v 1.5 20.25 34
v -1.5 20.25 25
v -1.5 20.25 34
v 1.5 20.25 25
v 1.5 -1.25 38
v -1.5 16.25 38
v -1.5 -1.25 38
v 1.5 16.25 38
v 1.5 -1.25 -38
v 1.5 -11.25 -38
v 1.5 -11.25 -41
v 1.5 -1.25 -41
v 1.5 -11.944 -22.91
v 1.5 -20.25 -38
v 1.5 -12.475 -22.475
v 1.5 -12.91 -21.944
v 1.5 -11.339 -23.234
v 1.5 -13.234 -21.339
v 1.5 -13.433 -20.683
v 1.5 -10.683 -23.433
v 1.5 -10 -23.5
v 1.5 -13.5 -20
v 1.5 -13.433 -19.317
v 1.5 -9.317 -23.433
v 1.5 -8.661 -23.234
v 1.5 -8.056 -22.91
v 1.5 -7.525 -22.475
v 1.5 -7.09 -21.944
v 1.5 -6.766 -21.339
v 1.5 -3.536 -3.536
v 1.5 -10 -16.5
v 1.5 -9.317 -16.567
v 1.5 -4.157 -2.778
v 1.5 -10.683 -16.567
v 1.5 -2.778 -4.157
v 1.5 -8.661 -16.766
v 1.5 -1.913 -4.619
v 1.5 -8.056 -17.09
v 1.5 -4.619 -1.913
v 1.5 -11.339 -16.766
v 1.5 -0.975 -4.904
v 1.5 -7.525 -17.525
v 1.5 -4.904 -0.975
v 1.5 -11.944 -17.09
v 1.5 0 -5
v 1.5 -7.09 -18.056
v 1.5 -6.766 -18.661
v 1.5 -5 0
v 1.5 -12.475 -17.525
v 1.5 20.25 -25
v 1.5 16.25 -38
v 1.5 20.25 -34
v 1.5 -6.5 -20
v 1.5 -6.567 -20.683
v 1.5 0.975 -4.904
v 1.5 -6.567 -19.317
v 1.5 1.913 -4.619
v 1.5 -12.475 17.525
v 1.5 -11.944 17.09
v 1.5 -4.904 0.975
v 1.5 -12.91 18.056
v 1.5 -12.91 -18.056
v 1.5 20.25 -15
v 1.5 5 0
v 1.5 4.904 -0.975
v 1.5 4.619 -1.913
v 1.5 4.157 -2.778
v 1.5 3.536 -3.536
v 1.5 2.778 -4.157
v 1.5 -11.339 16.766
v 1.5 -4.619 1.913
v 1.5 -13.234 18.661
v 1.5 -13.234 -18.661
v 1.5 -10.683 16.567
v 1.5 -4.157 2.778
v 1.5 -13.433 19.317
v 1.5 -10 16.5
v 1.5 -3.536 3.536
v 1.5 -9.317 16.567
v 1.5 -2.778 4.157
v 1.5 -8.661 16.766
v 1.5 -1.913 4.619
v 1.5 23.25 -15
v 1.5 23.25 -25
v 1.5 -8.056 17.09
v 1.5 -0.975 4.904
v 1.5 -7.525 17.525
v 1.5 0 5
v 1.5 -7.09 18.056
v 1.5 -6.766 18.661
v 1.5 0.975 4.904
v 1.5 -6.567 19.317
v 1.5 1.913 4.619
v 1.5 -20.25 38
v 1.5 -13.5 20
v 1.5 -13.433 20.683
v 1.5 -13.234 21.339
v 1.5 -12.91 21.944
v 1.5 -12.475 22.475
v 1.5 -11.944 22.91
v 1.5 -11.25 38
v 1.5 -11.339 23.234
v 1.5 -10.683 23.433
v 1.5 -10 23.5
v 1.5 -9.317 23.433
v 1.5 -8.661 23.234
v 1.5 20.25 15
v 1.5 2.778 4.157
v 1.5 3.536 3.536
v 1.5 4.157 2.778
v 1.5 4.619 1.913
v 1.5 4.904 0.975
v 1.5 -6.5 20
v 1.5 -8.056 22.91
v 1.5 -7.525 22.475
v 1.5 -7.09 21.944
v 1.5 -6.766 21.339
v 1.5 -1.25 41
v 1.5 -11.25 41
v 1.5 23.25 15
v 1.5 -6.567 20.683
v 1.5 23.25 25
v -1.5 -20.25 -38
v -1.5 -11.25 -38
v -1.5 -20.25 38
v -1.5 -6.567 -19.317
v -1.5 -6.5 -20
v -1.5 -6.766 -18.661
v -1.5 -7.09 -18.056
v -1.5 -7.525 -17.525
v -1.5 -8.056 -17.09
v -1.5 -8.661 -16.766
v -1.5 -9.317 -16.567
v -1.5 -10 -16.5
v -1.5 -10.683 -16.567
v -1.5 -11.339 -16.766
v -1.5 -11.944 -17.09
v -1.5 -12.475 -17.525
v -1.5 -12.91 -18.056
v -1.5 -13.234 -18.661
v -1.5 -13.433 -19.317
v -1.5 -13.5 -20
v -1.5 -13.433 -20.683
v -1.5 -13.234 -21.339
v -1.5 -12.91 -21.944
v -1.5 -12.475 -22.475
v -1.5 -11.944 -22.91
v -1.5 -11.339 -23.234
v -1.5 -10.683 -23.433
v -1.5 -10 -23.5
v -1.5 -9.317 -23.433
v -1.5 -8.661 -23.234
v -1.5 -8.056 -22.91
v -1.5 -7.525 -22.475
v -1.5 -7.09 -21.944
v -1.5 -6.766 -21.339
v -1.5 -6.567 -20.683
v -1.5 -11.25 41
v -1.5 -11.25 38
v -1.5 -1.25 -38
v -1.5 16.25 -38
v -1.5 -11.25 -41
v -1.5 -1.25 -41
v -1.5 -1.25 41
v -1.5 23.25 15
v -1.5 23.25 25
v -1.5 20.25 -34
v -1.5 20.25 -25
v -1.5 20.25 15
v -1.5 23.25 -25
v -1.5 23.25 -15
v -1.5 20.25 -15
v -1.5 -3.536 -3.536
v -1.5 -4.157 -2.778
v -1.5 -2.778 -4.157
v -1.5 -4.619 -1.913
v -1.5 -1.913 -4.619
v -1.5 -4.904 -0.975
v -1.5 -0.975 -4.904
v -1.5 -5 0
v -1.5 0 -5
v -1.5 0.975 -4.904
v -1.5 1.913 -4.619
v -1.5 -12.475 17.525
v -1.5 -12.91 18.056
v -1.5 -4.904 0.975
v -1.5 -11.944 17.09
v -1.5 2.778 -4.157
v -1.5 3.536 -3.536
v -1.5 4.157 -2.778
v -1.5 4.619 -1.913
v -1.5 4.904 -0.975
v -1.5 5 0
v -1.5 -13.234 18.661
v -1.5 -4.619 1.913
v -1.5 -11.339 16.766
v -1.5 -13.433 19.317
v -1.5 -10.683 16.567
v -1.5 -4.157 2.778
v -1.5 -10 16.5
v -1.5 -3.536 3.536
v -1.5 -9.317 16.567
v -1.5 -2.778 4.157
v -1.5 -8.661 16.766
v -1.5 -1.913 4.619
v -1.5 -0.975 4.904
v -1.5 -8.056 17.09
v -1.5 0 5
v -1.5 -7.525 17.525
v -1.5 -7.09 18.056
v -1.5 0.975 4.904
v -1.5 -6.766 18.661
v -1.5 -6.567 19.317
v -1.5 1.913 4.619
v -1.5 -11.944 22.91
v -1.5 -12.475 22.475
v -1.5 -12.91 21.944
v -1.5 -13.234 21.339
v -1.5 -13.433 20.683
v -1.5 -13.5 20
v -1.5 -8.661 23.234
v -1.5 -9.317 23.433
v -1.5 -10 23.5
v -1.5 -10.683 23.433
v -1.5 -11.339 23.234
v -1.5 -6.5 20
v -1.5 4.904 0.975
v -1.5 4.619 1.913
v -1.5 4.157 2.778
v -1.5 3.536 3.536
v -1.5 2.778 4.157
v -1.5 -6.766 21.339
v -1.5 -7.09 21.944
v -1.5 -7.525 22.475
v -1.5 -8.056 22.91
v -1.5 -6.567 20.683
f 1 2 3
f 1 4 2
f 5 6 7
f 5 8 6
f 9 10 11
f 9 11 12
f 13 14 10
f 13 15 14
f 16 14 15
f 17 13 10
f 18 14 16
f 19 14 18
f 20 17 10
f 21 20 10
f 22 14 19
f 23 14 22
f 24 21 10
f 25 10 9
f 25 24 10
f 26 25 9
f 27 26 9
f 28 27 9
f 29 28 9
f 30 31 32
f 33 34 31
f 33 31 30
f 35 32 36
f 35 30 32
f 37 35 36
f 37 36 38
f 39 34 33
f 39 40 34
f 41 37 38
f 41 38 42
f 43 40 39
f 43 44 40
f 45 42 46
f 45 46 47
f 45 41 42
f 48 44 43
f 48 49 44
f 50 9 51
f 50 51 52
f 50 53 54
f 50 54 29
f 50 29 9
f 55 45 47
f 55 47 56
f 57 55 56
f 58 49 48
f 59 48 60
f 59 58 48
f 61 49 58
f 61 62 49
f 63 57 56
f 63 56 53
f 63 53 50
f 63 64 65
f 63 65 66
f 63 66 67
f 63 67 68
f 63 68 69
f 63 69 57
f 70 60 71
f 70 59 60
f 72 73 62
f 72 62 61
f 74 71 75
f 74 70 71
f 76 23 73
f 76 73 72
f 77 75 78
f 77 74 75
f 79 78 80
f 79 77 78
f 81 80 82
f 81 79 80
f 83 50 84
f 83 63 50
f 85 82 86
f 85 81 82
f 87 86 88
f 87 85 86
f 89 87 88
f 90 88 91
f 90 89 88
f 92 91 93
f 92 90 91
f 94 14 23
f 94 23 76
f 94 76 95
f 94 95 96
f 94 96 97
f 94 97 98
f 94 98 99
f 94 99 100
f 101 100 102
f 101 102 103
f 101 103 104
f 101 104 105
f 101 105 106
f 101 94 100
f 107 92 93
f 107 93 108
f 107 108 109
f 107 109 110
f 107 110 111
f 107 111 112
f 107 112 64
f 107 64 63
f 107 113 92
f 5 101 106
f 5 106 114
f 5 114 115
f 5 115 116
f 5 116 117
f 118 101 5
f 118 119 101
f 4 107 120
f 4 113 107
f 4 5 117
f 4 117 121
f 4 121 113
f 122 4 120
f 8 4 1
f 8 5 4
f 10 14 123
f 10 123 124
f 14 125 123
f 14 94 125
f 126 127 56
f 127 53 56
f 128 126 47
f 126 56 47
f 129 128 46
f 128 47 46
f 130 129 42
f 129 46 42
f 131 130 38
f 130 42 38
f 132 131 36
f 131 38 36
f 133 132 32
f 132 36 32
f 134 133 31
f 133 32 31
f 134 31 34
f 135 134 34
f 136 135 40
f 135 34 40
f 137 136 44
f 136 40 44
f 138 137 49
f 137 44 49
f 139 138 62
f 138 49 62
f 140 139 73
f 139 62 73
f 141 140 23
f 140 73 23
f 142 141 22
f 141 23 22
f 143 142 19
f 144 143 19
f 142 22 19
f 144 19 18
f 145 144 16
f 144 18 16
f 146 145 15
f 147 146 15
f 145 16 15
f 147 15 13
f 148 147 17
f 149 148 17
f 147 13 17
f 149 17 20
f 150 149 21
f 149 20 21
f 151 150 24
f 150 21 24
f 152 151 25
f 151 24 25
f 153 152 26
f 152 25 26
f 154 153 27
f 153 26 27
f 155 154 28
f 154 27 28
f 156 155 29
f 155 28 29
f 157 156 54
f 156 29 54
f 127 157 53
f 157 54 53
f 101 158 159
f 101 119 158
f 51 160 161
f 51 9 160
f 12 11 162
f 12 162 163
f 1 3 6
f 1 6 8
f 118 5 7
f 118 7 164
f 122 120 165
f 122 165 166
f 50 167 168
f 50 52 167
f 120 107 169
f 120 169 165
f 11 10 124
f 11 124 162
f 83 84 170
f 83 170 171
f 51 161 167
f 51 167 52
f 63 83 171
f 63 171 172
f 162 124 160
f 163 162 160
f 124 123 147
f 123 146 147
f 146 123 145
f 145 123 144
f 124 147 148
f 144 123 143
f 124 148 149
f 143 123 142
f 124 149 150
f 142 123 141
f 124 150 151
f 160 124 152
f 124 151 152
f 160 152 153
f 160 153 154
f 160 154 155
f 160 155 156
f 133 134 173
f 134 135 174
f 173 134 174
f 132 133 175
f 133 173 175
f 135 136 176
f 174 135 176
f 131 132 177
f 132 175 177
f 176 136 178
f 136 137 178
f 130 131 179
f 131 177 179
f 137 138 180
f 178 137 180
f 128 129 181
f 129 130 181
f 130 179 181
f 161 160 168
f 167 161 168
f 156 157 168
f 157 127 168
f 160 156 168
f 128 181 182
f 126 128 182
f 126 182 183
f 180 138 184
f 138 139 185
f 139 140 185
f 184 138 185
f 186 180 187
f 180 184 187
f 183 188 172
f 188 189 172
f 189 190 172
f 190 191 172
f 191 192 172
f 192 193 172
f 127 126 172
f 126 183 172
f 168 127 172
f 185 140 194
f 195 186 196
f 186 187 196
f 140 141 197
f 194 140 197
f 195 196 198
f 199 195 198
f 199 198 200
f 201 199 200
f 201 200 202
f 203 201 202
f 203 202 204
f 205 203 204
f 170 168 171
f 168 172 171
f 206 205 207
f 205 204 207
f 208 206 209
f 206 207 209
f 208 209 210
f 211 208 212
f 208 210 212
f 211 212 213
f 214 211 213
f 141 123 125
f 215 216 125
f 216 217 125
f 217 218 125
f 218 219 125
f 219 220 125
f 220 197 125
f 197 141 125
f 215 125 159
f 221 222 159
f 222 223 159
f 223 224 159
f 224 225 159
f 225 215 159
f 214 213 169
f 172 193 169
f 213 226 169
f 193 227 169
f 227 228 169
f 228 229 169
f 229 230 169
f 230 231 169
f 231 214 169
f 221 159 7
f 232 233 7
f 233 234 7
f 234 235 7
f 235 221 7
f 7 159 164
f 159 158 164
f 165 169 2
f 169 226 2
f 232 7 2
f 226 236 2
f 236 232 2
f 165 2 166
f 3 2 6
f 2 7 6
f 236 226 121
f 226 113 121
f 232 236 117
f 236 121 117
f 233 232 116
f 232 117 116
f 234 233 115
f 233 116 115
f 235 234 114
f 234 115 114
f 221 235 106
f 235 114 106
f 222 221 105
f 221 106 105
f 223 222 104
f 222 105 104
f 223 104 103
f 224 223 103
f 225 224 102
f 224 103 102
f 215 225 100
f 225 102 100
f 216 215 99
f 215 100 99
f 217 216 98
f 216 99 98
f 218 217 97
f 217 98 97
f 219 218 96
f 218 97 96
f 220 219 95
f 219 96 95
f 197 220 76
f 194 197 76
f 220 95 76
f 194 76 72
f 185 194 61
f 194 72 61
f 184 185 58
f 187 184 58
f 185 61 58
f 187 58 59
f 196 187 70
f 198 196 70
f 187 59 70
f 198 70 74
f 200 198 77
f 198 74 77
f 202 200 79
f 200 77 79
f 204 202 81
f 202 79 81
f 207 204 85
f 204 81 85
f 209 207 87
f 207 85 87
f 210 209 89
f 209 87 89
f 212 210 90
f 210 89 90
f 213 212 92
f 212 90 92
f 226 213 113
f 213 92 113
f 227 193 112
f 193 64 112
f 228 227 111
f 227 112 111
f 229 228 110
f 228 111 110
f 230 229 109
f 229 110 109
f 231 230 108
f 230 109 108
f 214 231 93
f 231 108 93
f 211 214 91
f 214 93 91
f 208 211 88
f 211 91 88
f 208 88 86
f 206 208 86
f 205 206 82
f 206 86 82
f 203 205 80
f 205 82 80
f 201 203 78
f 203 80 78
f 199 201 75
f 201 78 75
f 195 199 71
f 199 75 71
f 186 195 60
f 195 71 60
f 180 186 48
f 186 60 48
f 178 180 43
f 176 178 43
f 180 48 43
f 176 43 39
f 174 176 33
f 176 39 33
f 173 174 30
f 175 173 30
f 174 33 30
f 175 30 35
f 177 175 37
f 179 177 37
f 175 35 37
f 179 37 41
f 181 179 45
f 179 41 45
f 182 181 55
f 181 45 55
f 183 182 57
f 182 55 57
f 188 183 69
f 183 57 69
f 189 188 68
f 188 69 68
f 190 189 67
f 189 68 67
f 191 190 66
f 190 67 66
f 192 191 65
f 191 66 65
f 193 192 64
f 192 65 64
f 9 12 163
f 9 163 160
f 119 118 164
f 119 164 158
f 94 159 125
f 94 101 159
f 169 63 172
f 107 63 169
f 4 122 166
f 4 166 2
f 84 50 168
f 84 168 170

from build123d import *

# Parameters (mm, degrees)
PAD_DEPTH         = 1.5
CHAMFER_SIZE      = 4
SKETCH001_R       = 5
SKETCH001_R_2     = 3.5
POCKET_DEPTH      = 1.501
POCKET_DEPTH_BACK = -1.501


with BuildPart() as part:
    # Sketch → Pad (new body, symmetric)
    with BuildSketch(Plane.YZ):
        Polygon((-20.25, 38), (-20.25, -38), (-11.25, -38), (-11.25, -41), (-1.25, -41), (-1.25, -38), (20.25, -38), (20.25, -25), (23.25, -25), (23.25, -15), (20.25, -15), (20.25, 15), (23.25, 15), (23.25, 25), (20.25, 25), (20.25, 38), (-1.25, 38), (-1.25, 41), (-11.25, 41), (-11.25, 38), align=None)
    extrude(amount=PAD_DEPTH, both=True)

    # Chamfer
    chamfer_edges = [part.edges().sort_by_distance(p)[0] for p in [
        (0, 20.25, 38),
        (0, 20.25, -38),
    ]]
    chamfer(chamfer_edges, length=CHAMFER_SIZE)

    # Sketch001 → Pocket (cut, two sides)
    with BuildSketch(Plane.YZ) as pocket_sk:
        Circle(SKETCH001_R)
        with Locations((-10, 20)):
            Circle(SKETCH001_R_2)
        with Locations((-10, -20)):
            Circle(SKETCH001_R_2)
    extrude(amount=-POCKET_DEPTH, mode=Mode.SUBTRACT)
    extrude(pocket_sk.sketch, amount=-POCKET_DEPTH_BACK, mode=Mode.SUBTRACT)


solid = part.part
